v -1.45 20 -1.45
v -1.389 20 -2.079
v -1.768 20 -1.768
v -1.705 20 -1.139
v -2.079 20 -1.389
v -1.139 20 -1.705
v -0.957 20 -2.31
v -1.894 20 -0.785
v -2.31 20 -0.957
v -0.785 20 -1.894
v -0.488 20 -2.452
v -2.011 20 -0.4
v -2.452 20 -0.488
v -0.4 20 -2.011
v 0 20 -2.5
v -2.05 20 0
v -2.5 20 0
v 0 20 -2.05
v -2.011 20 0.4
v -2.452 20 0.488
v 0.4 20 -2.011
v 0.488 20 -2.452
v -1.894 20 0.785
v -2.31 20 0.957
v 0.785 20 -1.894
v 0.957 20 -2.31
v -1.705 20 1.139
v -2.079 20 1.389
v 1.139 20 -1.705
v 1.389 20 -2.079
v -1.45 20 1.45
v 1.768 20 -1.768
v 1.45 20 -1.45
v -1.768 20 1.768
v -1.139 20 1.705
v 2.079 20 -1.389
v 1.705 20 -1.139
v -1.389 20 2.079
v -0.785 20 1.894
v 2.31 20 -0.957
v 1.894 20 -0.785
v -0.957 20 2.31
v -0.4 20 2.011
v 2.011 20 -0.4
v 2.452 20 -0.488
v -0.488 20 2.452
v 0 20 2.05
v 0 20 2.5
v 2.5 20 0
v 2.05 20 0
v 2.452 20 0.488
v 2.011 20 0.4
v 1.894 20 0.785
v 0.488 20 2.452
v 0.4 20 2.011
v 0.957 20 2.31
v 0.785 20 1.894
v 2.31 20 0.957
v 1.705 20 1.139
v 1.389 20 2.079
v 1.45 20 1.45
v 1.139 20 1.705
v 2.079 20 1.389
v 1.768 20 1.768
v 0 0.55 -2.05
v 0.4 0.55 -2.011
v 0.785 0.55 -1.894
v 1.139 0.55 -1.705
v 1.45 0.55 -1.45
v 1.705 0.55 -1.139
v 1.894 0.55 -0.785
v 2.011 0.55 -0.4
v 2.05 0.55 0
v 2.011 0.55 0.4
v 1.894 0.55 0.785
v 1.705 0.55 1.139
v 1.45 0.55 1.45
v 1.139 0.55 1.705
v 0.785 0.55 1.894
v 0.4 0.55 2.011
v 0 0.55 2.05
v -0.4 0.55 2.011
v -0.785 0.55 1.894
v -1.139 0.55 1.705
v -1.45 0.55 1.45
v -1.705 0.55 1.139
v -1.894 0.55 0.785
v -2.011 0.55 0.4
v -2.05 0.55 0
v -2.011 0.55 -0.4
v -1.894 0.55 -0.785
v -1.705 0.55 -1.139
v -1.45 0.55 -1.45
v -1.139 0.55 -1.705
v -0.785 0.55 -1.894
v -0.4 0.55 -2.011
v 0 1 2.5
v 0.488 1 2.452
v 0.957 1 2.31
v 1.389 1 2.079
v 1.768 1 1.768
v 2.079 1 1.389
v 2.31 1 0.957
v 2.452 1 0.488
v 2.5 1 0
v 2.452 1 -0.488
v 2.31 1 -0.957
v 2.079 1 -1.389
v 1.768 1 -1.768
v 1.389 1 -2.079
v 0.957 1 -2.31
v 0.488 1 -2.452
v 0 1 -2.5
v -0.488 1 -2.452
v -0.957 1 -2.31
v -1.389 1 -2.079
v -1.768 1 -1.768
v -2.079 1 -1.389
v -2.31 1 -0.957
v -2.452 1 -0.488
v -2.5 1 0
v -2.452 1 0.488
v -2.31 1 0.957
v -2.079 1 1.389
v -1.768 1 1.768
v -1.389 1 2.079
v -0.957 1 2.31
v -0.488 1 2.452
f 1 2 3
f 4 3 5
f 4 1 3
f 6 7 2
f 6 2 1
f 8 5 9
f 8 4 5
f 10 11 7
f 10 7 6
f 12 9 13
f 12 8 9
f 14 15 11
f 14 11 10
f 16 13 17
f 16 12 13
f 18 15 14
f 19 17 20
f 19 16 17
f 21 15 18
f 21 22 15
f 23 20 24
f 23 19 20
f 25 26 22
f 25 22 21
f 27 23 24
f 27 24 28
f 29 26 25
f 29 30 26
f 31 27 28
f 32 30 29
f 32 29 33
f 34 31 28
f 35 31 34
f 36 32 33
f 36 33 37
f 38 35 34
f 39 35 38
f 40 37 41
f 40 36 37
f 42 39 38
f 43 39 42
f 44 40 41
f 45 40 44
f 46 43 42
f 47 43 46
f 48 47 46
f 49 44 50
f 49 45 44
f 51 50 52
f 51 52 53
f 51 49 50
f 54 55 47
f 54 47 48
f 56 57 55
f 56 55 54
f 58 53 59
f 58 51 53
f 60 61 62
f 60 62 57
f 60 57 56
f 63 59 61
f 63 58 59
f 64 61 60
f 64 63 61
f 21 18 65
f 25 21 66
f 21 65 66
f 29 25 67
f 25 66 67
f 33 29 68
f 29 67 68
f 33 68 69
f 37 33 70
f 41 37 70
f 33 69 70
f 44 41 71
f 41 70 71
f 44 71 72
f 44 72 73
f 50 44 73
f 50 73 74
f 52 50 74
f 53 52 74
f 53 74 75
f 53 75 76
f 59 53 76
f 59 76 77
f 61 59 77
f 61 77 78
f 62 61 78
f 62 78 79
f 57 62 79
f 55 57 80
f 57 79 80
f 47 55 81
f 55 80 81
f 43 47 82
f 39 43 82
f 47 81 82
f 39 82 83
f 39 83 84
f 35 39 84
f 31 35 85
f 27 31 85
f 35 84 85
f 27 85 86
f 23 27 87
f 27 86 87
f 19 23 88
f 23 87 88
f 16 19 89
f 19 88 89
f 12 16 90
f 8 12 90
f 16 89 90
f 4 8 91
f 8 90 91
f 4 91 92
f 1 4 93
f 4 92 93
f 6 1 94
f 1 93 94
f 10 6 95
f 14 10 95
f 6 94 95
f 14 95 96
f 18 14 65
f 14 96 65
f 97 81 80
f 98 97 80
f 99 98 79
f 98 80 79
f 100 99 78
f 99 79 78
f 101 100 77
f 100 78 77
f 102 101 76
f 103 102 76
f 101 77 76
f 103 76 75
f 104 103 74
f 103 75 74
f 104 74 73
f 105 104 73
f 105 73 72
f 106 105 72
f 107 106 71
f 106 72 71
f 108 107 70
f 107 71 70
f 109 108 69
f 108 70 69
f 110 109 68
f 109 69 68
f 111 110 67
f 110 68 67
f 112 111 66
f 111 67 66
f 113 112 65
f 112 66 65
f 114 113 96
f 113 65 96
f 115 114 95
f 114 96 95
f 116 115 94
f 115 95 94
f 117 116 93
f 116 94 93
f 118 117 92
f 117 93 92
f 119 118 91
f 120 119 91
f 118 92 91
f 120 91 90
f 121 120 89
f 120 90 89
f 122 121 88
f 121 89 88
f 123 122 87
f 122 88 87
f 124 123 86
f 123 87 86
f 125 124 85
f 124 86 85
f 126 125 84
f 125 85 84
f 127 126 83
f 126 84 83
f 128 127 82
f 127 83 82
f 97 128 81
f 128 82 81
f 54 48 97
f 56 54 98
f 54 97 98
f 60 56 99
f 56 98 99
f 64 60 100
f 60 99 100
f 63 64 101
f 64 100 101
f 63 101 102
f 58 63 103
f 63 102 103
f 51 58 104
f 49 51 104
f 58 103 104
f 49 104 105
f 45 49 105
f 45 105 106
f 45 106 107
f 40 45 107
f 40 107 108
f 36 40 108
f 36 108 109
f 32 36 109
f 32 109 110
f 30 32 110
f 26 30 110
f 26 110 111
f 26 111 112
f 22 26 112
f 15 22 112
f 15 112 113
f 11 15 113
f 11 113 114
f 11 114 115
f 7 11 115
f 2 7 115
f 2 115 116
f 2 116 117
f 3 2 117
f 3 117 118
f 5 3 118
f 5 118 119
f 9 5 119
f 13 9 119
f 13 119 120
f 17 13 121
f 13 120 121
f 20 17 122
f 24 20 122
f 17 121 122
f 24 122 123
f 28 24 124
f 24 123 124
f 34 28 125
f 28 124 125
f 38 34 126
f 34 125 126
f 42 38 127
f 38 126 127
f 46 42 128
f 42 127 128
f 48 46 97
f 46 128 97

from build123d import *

# Parameters (mm, degrees)
SKETCH_1_R          = 2.5
EXTRUDE_1_DEPTH     = 20
SKETCH_2_R          = 2.05
CUT_EXTRUDE_1_DEPTH = 21.310096012
CHAMFER_1_SIZE      = 1


with BuildPart() as part:
    # 草图1 → 凸台-拉伸1 (new body)
    with BuildSketch(Plane(origin=(0, 0, 0), x_dir=(1, 0, 0), z_dir=(0, 1, 0))):
        with Locations(Location((0, 0, 0), (0, 0, 270))):
            Circle(SKETCH_1_R)
    extrude(amount=EXTRUDE_1_DEPTH)

    # 草图2 → 切除-拉伸1 (cut, through all)
    with BuildSketch(Plane.XZ):
        with Locations(Location((0, 0, 0), (0, 0, 270))):
            Circle(SKETCH_2_R)
    extrude(amount=-CUT_EXTRUDE_1_DEPTH, mode=Mode.SUBTRACT)

    # 倒角1
    # the kernel refuses this chamfer: 1 mm, written as the material it takes off along each edge
    with BuildSketch(Plane(origin=(0, 0, 0), x_dir=(0, 0, 1), z_dir=(-1, 0, 0))) as chamfer_1_piece_1:
        Polygon((2.5, CHAMFER_1_SIZE), (2.5 - CHAMFER_1_SIZE, 0), (2.5, 0), align=None)
    revolve(axis=Axis((0, 0, 0), (0, 1, 0)), mode=Mode.SUBTRACT)


solid = part.part
